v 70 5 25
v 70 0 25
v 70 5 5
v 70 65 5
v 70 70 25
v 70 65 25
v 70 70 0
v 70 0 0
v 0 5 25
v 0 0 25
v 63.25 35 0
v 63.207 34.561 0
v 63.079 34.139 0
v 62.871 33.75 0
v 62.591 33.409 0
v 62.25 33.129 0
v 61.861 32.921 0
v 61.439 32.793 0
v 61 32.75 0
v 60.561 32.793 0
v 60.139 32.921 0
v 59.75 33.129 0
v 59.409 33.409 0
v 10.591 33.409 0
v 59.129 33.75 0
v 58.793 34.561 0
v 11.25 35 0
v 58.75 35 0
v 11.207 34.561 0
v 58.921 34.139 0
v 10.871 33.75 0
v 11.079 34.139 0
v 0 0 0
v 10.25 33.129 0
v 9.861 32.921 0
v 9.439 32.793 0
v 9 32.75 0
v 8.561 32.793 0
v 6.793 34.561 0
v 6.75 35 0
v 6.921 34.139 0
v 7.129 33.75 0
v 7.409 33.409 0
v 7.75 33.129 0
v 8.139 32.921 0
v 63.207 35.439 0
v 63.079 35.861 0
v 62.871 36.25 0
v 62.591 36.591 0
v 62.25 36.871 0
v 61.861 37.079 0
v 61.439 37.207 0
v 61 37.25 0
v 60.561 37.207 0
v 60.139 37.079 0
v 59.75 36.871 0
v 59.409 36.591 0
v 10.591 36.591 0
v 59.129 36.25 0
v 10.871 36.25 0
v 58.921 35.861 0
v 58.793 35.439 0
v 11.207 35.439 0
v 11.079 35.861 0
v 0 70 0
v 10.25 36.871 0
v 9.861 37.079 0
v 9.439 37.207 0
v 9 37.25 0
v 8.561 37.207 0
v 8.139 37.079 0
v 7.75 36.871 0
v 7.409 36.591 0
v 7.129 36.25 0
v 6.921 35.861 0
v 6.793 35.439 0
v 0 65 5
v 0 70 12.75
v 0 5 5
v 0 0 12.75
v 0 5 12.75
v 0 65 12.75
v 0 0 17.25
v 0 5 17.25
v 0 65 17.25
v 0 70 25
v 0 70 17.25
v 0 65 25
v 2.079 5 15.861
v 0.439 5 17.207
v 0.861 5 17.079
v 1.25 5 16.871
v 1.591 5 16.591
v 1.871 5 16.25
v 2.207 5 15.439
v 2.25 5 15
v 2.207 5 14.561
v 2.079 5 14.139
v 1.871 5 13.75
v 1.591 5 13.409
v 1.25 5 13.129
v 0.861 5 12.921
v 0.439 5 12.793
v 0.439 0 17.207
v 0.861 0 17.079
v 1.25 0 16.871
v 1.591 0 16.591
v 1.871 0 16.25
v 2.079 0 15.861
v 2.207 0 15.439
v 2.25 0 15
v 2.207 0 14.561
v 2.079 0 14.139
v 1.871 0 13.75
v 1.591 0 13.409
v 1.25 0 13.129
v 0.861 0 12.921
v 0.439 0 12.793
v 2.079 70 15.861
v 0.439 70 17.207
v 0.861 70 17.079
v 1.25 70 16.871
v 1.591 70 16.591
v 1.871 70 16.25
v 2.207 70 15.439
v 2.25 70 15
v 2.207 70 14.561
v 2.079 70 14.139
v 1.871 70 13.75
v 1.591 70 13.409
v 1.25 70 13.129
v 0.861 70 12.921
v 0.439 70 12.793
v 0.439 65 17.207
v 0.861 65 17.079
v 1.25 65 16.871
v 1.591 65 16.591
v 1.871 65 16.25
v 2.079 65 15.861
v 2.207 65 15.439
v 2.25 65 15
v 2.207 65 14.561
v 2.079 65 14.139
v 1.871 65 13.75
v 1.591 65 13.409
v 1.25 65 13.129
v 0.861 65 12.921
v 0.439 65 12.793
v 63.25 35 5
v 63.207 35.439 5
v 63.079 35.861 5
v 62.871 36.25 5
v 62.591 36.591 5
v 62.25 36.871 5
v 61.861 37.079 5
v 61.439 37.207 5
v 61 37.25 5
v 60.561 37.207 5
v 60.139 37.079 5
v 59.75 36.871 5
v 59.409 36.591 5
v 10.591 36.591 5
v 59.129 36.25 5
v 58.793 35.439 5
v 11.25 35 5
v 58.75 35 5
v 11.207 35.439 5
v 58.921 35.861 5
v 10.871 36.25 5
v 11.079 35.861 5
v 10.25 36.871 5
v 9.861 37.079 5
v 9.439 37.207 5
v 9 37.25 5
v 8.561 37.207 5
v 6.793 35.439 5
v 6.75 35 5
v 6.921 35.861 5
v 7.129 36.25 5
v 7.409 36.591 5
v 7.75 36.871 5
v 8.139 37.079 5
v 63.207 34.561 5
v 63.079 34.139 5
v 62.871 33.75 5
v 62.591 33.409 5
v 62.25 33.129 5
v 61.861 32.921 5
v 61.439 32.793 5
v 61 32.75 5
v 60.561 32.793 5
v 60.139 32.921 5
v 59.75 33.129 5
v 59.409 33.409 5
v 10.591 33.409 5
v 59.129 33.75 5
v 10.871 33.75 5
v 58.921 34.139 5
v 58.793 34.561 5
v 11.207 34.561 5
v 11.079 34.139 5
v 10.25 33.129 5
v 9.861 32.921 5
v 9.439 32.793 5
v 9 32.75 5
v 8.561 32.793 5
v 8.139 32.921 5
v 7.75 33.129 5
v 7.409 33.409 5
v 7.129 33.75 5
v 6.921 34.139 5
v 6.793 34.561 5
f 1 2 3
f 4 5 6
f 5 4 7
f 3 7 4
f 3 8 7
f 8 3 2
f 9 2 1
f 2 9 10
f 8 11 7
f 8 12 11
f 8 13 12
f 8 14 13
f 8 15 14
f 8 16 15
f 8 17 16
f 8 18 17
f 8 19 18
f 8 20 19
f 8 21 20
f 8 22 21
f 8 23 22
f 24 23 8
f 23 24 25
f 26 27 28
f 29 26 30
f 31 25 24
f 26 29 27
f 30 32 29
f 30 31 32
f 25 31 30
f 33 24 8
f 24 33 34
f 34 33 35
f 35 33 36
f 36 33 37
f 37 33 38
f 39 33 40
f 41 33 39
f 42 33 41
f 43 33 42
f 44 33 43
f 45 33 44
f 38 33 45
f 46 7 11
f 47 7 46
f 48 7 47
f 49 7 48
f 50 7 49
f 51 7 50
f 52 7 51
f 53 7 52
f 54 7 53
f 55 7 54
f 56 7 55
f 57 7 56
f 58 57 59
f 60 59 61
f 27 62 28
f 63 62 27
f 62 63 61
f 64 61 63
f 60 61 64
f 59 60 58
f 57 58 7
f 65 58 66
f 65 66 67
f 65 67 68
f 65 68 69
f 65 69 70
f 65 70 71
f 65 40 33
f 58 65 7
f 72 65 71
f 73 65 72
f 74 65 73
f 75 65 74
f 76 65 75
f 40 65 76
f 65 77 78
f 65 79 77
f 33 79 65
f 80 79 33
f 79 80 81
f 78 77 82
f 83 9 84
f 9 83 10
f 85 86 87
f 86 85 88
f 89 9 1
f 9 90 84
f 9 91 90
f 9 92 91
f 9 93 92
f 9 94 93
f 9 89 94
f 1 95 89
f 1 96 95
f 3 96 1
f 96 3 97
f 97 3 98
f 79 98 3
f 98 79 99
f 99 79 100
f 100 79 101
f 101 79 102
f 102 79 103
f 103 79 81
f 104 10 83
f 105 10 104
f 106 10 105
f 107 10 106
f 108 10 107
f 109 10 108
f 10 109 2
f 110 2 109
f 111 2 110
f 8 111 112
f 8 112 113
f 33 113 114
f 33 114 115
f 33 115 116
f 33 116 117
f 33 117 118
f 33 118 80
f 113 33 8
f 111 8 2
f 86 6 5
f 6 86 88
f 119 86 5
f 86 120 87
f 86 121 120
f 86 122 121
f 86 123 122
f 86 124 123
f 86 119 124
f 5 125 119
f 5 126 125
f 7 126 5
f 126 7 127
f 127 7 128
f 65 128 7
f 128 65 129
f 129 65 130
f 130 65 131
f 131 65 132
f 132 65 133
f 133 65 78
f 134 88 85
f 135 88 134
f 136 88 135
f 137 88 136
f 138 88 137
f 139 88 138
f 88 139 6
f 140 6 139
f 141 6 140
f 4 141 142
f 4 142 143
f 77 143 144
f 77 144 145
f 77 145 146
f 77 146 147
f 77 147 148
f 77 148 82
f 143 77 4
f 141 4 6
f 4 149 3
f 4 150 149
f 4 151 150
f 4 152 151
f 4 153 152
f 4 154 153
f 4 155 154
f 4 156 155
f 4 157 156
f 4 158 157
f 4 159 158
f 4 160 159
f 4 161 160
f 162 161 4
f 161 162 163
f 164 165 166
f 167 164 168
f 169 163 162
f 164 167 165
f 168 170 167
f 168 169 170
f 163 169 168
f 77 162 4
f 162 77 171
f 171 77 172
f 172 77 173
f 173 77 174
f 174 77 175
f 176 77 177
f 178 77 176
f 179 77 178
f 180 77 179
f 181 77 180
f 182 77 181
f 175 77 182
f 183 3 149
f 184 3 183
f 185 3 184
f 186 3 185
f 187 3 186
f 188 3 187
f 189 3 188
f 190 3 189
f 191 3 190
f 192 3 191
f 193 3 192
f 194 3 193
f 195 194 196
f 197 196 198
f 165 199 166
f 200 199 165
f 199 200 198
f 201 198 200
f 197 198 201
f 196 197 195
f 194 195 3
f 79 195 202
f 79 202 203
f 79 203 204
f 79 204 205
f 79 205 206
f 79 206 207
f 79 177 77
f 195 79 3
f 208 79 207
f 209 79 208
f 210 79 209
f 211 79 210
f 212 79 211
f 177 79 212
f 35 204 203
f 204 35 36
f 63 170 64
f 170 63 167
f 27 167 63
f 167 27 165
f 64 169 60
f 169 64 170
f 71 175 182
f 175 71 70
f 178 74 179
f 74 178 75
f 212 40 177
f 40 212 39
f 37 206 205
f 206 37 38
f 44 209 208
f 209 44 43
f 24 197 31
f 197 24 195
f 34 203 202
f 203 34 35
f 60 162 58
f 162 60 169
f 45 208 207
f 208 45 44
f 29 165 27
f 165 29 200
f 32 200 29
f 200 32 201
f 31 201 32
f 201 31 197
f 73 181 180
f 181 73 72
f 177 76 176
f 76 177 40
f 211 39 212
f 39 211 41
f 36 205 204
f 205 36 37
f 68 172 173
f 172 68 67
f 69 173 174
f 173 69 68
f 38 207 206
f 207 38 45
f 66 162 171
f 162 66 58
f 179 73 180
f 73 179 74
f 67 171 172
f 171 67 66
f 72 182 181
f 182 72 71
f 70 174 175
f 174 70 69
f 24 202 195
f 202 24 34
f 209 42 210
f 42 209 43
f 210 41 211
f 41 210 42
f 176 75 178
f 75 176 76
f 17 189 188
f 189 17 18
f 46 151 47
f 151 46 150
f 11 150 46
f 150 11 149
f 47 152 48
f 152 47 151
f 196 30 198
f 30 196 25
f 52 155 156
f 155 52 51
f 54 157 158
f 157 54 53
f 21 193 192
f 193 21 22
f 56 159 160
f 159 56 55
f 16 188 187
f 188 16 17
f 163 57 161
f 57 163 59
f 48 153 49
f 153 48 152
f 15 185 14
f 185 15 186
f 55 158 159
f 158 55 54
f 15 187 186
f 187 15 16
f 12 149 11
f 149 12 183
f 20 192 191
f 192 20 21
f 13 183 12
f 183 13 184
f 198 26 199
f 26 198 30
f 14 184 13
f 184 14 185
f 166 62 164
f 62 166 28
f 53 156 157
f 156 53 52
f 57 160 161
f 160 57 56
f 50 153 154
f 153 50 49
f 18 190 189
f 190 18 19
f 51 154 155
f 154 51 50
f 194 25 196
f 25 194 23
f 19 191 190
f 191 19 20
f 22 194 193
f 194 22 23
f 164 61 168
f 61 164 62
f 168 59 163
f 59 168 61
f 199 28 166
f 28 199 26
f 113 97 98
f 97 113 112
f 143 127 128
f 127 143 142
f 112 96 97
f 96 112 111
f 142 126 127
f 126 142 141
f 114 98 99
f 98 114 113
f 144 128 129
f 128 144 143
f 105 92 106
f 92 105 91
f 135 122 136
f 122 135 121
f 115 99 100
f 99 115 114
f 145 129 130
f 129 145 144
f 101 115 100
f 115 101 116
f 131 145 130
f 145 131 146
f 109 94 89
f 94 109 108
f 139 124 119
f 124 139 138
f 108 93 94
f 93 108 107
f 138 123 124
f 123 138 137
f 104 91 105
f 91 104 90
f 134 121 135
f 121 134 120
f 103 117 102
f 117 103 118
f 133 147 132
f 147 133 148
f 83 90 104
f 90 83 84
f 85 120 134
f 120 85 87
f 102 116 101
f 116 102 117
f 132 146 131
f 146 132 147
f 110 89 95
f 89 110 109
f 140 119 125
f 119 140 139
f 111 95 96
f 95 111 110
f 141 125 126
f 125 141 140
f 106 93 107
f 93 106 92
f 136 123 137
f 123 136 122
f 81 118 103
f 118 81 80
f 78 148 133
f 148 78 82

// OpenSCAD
$fn = 32;

// ----------------------------------------------------------------------
// U-bracket: 70 x 70 x 25 mm
// ----------------------------------------------------------------------

// --- parameters (mm) ---
base_len = 70;            // outer length, X
channel_w = 70;           // outer width, Y
upright_h = 25;           // upright height, Z
mat_t = 5;                // wall thickness
hole_d = 4.5;             // clearance for M4

module hole_z(px, py) {
  translate([px, py, -0.5]) cylinder(h = mat_t + 1, d = hole_d);
}
module hole_y_pz(pz) {
  /* through both uprights along Y */
  translate([0, -0.5, pz]) rotate([-90, 0, 0]) cylinder(h = channel_w + 1, d = hole_d);
}

module base() {
  cube([base_len, channel_w, mat_t]);
}

module uprights() {
  cube([base_len, mat_t, upright_h]);
  translate([0, channel_w - mat_t, 0]) cube([base_len, mat_t, upright_h]);
}

difference() {
  union() {
    base();
    uprights();
  }
  hole_z(9, 35);
  hole_z(61, 35);
  hole_y_pz(15);
}
